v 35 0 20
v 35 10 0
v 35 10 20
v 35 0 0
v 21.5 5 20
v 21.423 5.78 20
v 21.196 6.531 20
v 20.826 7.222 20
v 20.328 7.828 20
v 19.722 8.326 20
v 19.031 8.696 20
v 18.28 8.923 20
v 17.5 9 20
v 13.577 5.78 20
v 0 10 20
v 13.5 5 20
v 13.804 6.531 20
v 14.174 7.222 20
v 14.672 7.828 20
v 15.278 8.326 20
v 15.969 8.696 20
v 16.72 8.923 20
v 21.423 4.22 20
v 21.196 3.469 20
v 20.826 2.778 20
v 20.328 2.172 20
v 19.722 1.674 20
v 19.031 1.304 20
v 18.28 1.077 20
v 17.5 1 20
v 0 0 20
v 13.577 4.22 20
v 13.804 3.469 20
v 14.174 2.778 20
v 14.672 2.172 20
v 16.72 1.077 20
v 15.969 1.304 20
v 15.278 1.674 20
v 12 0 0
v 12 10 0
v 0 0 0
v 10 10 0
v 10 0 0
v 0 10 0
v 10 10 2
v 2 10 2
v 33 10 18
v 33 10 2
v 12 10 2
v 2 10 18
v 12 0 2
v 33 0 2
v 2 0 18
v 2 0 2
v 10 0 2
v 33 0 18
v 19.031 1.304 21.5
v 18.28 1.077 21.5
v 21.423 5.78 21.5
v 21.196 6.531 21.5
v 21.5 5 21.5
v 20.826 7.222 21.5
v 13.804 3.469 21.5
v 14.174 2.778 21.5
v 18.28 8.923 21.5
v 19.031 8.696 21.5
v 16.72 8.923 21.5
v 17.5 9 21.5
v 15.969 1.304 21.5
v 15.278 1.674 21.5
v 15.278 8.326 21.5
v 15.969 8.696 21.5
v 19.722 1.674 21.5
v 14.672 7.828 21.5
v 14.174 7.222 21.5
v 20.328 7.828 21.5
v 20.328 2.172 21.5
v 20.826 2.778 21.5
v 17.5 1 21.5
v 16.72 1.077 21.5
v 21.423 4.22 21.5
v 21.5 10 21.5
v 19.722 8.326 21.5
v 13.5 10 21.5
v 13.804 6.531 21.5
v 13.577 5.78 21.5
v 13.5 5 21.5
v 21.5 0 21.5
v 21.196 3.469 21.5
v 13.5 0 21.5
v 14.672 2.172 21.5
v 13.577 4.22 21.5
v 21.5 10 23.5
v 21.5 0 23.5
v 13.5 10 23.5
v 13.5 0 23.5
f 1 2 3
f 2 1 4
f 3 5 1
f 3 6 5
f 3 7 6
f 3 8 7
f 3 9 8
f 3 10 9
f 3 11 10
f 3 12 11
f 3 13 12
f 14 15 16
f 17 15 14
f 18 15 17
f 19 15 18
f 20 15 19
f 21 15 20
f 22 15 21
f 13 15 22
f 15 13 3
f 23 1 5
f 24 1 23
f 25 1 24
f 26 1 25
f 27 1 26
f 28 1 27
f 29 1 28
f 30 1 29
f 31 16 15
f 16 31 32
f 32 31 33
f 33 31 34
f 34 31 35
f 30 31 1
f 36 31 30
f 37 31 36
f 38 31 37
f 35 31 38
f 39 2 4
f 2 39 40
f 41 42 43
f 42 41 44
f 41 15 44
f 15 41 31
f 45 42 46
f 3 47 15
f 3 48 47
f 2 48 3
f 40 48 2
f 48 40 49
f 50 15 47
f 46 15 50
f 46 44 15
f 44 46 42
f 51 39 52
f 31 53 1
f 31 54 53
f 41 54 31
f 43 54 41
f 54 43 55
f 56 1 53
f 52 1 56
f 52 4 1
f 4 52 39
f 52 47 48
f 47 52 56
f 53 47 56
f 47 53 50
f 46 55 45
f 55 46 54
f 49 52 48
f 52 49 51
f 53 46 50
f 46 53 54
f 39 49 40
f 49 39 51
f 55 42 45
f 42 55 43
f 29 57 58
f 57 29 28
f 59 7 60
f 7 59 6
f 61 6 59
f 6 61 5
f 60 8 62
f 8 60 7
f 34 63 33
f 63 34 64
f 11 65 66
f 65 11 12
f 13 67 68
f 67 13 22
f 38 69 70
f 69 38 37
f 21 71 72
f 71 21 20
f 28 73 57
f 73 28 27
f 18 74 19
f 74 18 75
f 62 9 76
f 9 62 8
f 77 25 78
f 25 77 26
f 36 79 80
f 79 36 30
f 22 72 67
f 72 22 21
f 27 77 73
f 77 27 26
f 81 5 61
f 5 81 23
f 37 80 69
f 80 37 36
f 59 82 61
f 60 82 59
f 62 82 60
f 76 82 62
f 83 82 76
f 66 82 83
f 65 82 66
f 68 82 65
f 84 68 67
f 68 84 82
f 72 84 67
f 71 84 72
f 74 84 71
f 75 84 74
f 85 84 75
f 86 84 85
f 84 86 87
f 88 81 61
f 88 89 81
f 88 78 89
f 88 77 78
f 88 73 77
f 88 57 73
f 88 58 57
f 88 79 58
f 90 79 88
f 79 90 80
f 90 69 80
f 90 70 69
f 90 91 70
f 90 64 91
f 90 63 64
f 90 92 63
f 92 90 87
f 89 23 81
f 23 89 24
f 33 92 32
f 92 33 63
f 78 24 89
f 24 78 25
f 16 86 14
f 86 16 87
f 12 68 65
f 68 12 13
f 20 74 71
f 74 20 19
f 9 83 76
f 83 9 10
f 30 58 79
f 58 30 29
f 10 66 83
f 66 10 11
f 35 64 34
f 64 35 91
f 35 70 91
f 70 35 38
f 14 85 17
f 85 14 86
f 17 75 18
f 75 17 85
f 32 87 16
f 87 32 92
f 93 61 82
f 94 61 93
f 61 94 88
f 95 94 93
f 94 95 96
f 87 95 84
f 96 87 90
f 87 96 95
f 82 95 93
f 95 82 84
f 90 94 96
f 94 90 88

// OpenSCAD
module clip(){
    difference() {
        cube([35,10,20]);
        translate([2,-1,2]) cube([31,12,16]);
        translate([10,-1,-1]) cube([2,12,4]);
    }
    translate([35/2, 10/2, 20]) cylinder(d = 8, h= 1.5, $fn = 32);
    translate([35/2 - 8/2, 0, 20 + 1.5]) cube([8,10,2]);
}

clip();
